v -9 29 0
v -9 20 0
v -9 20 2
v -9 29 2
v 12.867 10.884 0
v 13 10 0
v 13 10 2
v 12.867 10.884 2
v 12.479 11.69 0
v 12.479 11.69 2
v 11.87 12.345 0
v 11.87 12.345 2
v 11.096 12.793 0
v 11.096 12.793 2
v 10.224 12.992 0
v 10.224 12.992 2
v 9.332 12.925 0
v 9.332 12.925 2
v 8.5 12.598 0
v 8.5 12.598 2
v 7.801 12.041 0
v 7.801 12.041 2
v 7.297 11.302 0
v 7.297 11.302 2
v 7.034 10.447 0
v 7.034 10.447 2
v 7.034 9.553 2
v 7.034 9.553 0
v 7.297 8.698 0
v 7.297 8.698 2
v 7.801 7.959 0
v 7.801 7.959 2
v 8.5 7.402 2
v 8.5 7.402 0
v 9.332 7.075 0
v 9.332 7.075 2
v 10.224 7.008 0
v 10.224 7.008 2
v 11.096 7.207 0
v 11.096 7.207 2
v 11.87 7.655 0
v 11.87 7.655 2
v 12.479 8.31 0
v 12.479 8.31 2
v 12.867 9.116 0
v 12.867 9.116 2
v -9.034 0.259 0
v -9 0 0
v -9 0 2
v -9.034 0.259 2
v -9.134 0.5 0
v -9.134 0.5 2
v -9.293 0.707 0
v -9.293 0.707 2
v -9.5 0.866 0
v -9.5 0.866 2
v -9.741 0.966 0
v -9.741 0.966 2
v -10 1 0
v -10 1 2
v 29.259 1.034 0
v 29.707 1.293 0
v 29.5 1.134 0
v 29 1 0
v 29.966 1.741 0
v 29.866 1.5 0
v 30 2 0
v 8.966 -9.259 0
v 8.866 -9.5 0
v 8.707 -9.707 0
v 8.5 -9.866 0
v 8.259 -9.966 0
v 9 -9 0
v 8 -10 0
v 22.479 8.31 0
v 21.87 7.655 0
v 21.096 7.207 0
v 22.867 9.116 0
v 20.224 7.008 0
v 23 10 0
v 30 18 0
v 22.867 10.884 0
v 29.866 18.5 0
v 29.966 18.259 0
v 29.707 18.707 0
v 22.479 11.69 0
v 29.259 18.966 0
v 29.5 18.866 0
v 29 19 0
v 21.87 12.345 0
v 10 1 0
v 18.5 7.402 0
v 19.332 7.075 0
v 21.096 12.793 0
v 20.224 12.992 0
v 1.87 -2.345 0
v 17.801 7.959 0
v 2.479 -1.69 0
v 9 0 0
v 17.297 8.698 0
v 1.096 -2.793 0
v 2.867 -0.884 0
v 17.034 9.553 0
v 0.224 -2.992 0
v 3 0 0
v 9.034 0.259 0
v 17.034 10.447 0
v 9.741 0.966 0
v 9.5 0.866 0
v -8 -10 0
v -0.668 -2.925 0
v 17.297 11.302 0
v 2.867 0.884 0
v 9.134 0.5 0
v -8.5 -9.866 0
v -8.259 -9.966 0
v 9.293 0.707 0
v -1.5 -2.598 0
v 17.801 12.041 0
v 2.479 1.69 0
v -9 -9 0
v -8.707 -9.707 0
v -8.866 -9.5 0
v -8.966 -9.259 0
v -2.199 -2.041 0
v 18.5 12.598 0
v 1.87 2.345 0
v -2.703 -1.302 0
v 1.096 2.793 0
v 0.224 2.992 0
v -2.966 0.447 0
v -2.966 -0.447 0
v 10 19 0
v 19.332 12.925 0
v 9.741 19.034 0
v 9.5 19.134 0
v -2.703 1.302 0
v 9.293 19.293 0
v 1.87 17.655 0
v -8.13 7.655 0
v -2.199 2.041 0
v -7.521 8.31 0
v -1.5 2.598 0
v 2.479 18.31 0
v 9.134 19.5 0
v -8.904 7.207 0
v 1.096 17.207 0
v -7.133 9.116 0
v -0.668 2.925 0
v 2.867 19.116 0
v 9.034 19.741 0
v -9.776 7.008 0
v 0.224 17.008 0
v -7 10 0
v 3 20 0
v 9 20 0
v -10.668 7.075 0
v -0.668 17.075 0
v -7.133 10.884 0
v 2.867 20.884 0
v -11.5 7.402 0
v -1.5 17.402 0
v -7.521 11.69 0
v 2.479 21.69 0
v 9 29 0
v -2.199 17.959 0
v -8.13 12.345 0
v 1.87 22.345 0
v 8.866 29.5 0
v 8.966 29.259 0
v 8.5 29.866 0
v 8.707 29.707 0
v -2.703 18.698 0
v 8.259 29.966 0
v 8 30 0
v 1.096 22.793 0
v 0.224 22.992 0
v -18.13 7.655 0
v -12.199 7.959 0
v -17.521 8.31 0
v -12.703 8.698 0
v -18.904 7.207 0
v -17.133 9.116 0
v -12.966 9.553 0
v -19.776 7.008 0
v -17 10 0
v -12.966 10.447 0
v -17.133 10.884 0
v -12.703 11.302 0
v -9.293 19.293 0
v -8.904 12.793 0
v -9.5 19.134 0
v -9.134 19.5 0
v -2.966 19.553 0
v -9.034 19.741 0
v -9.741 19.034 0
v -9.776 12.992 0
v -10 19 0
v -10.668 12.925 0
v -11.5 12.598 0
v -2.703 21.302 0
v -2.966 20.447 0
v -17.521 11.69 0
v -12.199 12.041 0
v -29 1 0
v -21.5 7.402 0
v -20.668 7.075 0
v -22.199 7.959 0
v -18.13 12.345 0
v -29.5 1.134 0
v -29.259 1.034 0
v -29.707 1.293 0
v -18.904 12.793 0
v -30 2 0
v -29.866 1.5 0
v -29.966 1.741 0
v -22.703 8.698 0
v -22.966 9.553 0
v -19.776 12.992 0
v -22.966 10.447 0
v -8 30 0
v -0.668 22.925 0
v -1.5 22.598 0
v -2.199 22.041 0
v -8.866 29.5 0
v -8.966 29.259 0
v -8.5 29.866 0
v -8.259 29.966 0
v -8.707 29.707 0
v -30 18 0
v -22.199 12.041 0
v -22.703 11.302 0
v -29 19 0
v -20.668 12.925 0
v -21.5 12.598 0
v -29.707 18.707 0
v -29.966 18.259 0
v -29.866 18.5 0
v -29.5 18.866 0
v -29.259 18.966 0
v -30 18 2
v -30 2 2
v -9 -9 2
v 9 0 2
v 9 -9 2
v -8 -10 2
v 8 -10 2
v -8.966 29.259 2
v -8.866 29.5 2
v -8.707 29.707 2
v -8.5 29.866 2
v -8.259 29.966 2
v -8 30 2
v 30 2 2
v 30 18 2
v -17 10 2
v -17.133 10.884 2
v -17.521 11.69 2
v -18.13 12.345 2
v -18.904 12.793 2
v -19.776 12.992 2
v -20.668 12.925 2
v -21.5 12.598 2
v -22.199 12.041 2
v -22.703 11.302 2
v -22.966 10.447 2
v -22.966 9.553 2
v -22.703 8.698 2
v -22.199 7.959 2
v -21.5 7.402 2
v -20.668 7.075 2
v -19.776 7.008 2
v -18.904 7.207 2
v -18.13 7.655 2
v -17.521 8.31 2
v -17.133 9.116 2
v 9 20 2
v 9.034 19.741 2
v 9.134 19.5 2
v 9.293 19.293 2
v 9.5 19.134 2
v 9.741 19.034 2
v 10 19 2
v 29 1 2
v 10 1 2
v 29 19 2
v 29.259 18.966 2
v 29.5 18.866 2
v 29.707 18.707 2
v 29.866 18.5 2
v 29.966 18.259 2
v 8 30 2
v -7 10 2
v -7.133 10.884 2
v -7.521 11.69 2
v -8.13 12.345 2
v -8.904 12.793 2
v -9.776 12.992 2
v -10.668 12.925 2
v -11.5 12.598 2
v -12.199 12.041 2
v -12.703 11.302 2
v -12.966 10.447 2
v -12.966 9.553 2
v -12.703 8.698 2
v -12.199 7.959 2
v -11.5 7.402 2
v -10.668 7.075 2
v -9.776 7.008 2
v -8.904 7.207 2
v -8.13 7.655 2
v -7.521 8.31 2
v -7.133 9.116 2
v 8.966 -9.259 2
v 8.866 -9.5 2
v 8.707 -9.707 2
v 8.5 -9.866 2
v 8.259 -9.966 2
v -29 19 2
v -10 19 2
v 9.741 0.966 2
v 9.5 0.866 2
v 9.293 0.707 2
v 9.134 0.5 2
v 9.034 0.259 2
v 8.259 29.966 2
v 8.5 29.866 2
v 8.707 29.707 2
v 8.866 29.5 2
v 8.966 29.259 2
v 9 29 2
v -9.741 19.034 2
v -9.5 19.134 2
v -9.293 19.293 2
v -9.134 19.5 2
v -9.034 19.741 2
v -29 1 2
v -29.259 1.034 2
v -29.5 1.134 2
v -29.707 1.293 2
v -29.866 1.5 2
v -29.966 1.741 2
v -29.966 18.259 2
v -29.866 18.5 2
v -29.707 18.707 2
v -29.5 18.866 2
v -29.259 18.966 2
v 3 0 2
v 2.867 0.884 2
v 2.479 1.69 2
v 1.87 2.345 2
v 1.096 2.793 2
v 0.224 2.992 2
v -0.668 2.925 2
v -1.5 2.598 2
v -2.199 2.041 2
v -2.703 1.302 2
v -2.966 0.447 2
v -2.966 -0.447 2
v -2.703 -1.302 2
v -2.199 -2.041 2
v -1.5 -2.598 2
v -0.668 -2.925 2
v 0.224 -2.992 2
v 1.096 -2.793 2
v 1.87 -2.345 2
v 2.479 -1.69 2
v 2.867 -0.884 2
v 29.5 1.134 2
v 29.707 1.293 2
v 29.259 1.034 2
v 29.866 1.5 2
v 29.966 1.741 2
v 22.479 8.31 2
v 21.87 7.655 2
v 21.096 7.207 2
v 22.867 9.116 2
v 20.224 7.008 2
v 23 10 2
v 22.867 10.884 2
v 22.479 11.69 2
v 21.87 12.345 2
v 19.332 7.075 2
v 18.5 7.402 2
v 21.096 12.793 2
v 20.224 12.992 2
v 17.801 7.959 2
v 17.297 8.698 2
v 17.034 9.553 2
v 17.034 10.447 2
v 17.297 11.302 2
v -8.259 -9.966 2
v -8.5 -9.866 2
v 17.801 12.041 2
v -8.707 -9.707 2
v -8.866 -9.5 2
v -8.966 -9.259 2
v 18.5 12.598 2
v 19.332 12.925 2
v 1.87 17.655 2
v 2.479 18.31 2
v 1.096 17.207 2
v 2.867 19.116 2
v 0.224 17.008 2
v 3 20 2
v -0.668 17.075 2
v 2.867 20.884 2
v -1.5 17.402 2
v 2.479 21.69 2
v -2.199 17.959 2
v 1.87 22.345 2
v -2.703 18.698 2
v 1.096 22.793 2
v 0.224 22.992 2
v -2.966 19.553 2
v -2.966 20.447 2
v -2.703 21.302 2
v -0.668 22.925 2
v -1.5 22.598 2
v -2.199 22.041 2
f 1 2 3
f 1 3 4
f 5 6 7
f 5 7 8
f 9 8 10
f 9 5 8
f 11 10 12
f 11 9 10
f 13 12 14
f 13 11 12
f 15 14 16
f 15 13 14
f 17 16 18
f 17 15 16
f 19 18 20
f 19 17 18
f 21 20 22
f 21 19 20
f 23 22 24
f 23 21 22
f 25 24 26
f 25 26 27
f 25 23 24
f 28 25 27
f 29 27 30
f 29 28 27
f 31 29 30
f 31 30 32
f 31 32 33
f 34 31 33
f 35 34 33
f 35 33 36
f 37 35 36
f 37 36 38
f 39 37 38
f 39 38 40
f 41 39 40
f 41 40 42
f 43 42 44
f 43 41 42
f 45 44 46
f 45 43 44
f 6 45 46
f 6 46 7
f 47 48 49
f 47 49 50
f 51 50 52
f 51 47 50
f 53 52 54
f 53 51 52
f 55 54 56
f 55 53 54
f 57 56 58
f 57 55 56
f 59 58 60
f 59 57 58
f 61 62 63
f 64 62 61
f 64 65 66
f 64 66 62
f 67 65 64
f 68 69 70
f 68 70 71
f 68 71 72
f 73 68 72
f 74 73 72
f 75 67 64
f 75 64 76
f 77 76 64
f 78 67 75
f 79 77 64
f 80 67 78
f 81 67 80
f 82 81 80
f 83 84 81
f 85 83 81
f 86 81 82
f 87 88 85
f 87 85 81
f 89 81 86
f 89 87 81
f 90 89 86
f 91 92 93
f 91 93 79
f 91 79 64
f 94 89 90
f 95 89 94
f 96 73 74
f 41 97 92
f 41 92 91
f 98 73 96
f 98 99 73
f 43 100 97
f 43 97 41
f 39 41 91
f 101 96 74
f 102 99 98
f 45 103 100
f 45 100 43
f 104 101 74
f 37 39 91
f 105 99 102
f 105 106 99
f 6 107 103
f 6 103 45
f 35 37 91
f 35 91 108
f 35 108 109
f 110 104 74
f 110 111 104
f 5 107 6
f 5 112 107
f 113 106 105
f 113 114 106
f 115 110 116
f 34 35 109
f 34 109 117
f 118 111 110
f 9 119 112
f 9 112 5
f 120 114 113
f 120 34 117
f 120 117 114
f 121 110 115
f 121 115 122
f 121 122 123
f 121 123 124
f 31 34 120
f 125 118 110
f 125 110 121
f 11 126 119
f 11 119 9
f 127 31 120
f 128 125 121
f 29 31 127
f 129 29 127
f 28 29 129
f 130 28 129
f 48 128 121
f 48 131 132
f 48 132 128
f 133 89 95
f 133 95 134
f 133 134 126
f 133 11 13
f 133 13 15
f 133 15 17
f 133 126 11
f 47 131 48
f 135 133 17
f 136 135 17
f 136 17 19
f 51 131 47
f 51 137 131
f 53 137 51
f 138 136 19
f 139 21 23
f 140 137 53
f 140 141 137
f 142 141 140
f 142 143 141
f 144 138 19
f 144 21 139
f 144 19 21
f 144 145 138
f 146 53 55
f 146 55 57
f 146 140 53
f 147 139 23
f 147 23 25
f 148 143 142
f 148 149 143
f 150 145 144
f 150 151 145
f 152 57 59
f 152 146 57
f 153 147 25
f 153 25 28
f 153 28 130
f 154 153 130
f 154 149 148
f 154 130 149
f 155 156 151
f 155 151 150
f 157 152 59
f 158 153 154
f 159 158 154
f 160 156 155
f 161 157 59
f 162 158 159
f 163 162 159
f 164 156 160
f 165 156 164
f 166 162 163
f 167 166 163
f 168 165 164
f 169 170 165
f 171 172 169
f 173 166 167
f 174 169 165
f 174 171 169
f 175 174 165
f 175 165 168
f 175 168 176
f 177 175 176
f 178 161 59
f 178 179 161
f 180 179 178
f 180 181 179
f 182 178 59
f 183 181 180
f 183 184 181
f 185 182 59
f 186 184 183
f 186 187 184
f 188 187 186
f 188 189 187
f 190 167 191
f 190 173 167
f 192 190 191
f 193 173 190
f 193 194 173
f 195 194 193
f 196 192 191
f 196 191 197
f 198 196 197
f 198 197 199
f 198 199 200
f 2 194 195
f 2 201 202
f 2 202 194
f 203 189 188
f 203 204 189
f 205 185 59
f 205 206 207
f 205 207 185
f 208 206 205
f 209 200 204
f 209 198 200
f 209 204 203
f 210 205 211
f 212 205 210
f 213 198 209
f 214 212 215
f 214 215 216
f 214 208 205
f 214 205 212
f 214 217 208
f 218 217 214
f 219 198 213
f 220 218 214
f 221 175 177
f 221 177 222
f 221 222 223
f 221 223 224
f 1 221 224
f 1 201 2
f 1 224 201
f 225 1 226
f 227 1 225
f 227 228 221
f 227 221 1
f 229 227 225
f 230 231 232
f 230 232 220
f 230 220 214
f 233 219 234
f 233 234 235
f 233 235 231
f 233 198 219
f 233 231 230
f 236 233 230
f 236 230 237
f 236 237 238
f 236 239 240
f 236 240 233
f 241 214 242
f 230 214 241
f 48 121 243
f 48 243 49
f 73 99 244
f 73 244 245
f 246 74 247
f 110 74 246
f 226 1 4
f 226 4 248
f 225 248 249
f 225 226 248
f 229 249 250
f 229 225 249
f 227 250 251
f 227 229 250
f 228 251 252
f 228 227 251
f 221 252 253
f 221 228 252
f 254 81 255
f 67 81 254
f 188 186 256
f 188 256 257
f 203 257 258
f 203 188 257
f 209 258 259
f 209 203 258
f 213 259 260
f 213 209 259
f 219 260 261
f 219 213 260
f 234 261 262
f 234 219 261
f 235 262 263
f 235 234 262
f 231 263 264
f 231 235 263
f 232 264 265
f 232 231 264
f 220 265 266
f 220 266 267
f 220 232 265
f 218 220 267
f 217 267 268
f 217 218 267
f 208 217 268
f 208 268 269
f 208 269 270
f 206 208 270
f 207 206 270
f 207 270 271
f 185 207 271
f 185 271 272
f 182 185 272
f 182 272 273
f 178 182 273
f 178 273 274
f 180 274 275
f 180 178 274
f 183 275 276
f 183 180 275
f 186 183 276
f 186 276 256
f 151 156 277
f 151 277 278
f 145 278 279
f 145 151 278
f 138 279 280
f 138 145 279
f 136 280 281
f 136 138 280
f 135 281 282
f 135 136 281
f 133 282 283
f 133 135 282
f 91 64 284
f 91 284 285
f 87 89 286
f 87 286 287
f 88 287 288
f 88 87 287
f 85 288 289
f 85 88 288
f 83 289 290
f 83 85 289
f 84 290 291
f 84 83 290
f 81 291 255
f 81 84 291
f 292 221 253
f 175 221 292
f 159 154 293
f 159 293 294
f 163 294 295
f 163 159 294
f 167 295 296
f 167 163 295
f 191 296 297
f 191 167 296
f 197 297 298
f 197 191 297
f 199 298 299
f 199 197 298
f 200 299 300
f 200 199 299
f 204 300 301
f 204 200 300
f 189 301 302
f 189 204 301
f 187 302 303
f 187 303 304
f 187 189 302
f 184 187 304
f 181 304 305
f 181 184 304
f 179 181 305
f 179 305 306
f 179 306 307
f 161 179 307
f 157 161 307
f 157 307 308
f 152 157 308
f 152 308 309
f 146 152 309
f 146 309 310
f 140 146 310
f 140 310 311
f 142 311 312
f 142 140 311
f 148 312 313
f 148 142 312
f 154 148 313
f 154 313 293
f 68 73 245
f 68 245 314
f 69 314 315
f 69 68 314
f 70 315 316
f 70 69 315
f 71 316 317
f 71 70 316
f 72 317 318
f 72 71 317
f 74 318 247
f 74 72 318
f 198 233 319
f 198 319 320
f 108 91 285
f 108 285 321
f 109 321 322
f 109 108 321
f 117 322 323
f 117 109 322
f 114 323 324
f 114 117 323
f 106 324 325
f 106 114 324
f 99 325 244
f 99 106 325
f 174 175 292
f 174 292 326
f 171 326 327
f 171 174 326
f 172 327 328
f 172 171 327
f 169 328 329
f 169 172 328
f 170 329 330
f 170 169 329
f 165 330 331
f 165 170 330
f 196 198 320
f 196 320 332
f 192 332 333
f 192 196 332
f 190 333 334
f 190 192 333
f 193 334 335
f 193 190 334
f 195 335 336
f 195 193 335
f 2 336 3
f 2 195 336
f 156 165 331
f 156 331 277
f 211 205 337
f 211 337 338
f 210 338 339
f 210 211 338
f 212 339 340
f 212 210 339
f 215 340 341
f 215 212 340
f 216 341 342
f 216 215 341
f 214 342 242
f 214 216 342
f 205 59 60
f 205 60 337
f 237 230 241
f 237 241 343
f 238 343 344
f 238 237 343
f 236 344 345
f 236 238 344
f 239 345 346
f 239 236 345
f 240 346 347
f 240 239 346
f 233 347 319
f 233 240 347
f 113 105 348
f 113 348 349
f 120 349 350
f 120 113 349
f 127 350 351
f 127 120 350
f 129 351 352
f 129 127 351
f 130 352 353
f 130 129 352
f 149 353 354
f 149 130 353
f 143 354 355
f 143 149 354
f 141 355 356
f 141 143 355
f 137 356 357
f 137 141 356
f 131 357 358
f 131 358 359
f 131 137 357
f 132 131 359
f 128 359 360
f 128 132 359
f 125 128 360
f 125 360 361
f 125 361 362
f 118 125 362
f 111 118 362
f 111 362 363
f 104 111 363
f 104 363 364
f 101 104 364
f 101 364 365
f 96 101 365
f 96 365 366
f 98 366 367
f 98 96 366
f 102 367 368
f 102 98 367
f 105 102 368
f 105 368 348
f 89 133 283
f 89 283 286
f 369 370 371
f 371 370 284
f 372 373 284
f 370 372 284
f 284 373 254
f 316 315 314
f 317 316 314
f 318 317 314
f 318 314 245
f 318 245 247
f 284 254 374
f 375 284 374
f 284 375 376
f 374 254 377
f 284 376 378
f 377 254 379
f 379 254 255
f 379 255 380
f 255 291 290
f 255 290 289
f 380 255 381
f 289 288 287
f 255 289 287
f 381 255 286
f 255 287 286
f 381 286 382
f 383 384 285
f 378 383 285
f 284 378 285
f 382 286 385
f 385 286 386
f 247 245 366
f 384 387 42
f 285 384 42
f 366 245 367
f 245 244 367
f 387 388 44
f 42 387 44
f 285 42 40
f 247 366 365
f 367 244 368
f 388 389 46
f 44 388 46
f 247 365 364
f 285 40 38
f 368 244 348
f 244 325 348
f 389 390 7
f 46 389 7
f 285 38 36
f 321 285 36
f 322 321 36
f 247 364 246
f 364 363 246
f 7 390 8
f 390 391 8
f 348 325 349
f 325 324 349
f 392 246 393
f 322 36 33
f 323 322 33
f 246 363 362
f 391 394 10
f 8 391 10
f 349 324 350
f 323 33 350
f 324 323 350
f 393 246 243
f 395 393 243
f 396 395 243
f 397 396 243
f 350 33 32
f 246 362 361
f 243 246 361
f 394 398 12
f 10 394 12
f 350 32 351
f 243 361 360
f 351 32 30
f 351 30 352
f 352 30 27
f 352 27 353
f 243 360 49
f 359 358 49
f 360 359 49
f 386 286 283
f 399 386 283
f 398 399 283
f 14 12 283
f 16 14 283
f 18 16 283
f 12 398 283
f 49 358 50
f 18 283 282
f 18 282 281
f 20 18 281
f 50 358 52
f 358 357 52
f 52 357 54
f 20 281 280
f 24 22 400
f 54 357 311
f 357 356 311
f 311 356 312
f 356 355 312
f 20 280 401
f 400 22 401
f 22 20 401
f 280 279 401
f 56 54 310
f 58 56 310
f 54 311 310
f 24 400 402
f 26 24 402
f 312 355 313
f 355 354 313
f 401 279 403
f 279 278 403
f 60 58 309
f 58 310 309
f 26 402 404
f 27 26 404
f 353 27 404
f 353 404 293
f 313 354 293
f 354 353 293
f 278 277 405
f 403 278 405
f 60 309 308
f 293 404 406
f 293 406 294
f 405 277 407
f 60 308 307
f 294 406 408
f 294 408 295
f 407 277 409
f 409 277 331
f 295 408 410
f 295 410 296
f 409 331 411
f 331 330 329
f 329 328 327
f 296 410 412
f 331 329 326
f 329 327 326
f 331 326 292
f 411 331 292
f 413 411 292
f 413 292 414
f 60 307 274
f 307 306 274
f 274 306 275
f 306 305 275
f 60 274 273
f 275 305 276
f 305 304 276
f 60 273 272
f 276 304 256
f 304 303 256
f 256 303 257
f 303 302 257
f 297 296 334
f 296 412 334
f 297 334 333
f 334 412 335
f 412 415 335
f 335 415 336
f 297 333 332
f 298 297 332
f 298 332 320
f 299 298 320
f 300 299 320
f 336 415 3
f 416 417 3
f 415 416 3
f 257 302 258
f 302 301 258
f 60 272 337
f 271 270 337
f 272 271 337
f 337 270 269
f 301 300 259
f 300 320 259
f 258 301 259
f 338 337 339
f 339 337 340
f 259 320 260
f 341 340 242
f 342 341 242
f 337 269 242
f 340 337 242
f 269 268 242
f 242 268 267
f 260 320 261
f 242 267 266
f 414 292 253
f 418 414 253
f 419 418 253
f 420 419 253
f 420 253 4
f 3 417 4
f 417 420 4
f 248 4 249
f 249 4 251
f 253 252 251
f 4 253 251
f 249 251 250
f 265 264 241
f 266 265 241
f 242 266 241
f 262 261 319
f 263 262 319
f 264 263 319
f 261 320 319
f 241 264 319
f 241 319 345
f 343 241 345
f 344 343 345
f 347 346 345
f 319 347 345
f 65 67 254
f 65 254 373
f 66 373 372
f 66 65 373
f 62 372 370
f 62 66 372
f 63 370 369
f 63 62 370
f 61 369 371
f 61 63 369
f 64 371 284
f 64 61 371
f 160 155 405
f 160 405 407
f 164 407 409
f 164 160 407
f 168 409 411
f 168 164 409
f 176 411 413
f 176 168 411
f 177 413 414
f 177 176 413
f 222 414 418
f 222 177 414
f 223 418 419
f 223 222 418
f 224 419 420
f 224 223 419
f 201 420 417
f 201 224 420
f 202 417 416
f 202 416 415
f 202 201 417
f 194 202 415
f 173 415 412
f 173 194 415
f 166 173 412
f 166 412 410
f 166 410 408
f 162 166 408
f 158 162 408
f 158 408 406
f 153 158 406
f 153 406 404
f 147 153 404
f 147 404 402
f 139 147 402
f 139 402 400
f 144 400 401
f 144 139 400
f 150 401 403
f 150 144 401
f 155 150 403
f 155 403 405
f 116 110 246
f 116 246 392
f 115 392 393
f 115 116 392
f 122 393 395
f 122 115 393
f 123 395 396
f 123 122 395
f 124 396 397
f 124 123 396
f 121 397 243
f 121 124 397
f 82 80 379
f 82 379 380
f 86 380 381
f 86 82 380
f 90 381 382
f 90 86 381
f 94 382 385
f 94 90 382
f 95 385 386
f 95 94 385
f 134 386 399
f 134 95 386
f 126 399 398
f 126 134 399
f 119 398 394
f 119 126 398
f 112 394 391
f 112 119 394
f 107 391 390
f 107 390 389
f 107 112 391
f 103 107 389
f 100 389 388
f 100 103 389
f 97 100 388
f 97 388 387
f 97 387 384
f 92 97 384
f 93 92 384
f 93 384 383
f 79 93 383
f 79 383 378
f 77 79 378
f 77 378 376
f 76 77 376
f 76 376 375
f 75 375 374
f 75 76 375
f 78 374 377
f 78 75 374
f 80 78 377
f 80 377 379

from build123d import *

# Parameters (mm, degrees)
SKETCH_1_R      = 3
EXTRUDE_1_DEPTH = 2


with BuildPart() as part:
    # 草图1 → 凸台-拉伸1 (new body)
    with BuildSketch(Plane.XY):
        with BuildLine():
            Line((-9, -9), (-9, 0))
            ThreePointArc((-9, 0), (-9.292893219, 0.707106781), (-10, 1))
            Line((-10, 1), (-29, 1))
            ThreePointArc((-29, 1), (-29.707106781, 1.292893219), (-30, 2))
            Line((-30, 2), (-30, 18))
            ThreePointArc((-30, 18), (-29.707106781, 18.707106781), (-29, 19))
            Line((-29, 19), (-10, 19))
            ThreePointArc((-10, 19), (-9.292893219, 19.292893219), (-9, 20))
            Line((-9, 20), (-9, 29))
            ThreePointArc((-9, 29), (-8.707106781, 29.707106781), (-8, 30))
            Line((-8, 30), (8, 30))
            ThreePointArc((8, 30), (8.707106781, 29.707106781), (9, 29))
            Line((9, 29), (9, 20))
            ThreePointArc((9, 20), (9.292893219, 19.292893219), (10, 19))
            Line((10, 19), (29, 19))
            ThreePointArc((29, 19), (29.707106781, 18.707106781), (30, 18))
            Line((30, 18), (30, 2))
            ThreePointArc((30, 2), (29.707106781, 1.292893219), (29, 1))
            Line((29, 1), (10, 1))
            ThreePointArc((10, 1), (9.292893219, 0.707106781), (9, 0))
            Line((9, 0), (9, -9))
            ThreePointArc((9, -9), (8.707106781, -9.707106781), (8, -10))
            Line((8, -10), (-8, -10))
            ThreePointArc((-8, -10), (-8.707106781, -9.707106781), (-9, -9))
        make_face()
        with Locations((0, 20)):
            Circle(SKETCH_1_R, mode=Mode.SUBTRACT)
        Circle(SKETCH_1_R, mode=Mode.SUBTRACT)
        with Locations((-20, 10)):
            Circle(SKETCH_1_R, mode=Mode.SUBTRACT)
        with Locations((-10, 10)):
            Circle(SKETCH_1_R, mode=Mode.SUBTRACT)
        with Locations((20, 10)):
            Circle(SKETCH_1_R, mode=Mode.SUBTRACT)
        with Locations((10, 10)):
            Circle(SKETCH_1_R, mode=Mode.SUBTRACT)
    extrude(amount=EXTRUDE_1_DEPTH)


solid = part.part
